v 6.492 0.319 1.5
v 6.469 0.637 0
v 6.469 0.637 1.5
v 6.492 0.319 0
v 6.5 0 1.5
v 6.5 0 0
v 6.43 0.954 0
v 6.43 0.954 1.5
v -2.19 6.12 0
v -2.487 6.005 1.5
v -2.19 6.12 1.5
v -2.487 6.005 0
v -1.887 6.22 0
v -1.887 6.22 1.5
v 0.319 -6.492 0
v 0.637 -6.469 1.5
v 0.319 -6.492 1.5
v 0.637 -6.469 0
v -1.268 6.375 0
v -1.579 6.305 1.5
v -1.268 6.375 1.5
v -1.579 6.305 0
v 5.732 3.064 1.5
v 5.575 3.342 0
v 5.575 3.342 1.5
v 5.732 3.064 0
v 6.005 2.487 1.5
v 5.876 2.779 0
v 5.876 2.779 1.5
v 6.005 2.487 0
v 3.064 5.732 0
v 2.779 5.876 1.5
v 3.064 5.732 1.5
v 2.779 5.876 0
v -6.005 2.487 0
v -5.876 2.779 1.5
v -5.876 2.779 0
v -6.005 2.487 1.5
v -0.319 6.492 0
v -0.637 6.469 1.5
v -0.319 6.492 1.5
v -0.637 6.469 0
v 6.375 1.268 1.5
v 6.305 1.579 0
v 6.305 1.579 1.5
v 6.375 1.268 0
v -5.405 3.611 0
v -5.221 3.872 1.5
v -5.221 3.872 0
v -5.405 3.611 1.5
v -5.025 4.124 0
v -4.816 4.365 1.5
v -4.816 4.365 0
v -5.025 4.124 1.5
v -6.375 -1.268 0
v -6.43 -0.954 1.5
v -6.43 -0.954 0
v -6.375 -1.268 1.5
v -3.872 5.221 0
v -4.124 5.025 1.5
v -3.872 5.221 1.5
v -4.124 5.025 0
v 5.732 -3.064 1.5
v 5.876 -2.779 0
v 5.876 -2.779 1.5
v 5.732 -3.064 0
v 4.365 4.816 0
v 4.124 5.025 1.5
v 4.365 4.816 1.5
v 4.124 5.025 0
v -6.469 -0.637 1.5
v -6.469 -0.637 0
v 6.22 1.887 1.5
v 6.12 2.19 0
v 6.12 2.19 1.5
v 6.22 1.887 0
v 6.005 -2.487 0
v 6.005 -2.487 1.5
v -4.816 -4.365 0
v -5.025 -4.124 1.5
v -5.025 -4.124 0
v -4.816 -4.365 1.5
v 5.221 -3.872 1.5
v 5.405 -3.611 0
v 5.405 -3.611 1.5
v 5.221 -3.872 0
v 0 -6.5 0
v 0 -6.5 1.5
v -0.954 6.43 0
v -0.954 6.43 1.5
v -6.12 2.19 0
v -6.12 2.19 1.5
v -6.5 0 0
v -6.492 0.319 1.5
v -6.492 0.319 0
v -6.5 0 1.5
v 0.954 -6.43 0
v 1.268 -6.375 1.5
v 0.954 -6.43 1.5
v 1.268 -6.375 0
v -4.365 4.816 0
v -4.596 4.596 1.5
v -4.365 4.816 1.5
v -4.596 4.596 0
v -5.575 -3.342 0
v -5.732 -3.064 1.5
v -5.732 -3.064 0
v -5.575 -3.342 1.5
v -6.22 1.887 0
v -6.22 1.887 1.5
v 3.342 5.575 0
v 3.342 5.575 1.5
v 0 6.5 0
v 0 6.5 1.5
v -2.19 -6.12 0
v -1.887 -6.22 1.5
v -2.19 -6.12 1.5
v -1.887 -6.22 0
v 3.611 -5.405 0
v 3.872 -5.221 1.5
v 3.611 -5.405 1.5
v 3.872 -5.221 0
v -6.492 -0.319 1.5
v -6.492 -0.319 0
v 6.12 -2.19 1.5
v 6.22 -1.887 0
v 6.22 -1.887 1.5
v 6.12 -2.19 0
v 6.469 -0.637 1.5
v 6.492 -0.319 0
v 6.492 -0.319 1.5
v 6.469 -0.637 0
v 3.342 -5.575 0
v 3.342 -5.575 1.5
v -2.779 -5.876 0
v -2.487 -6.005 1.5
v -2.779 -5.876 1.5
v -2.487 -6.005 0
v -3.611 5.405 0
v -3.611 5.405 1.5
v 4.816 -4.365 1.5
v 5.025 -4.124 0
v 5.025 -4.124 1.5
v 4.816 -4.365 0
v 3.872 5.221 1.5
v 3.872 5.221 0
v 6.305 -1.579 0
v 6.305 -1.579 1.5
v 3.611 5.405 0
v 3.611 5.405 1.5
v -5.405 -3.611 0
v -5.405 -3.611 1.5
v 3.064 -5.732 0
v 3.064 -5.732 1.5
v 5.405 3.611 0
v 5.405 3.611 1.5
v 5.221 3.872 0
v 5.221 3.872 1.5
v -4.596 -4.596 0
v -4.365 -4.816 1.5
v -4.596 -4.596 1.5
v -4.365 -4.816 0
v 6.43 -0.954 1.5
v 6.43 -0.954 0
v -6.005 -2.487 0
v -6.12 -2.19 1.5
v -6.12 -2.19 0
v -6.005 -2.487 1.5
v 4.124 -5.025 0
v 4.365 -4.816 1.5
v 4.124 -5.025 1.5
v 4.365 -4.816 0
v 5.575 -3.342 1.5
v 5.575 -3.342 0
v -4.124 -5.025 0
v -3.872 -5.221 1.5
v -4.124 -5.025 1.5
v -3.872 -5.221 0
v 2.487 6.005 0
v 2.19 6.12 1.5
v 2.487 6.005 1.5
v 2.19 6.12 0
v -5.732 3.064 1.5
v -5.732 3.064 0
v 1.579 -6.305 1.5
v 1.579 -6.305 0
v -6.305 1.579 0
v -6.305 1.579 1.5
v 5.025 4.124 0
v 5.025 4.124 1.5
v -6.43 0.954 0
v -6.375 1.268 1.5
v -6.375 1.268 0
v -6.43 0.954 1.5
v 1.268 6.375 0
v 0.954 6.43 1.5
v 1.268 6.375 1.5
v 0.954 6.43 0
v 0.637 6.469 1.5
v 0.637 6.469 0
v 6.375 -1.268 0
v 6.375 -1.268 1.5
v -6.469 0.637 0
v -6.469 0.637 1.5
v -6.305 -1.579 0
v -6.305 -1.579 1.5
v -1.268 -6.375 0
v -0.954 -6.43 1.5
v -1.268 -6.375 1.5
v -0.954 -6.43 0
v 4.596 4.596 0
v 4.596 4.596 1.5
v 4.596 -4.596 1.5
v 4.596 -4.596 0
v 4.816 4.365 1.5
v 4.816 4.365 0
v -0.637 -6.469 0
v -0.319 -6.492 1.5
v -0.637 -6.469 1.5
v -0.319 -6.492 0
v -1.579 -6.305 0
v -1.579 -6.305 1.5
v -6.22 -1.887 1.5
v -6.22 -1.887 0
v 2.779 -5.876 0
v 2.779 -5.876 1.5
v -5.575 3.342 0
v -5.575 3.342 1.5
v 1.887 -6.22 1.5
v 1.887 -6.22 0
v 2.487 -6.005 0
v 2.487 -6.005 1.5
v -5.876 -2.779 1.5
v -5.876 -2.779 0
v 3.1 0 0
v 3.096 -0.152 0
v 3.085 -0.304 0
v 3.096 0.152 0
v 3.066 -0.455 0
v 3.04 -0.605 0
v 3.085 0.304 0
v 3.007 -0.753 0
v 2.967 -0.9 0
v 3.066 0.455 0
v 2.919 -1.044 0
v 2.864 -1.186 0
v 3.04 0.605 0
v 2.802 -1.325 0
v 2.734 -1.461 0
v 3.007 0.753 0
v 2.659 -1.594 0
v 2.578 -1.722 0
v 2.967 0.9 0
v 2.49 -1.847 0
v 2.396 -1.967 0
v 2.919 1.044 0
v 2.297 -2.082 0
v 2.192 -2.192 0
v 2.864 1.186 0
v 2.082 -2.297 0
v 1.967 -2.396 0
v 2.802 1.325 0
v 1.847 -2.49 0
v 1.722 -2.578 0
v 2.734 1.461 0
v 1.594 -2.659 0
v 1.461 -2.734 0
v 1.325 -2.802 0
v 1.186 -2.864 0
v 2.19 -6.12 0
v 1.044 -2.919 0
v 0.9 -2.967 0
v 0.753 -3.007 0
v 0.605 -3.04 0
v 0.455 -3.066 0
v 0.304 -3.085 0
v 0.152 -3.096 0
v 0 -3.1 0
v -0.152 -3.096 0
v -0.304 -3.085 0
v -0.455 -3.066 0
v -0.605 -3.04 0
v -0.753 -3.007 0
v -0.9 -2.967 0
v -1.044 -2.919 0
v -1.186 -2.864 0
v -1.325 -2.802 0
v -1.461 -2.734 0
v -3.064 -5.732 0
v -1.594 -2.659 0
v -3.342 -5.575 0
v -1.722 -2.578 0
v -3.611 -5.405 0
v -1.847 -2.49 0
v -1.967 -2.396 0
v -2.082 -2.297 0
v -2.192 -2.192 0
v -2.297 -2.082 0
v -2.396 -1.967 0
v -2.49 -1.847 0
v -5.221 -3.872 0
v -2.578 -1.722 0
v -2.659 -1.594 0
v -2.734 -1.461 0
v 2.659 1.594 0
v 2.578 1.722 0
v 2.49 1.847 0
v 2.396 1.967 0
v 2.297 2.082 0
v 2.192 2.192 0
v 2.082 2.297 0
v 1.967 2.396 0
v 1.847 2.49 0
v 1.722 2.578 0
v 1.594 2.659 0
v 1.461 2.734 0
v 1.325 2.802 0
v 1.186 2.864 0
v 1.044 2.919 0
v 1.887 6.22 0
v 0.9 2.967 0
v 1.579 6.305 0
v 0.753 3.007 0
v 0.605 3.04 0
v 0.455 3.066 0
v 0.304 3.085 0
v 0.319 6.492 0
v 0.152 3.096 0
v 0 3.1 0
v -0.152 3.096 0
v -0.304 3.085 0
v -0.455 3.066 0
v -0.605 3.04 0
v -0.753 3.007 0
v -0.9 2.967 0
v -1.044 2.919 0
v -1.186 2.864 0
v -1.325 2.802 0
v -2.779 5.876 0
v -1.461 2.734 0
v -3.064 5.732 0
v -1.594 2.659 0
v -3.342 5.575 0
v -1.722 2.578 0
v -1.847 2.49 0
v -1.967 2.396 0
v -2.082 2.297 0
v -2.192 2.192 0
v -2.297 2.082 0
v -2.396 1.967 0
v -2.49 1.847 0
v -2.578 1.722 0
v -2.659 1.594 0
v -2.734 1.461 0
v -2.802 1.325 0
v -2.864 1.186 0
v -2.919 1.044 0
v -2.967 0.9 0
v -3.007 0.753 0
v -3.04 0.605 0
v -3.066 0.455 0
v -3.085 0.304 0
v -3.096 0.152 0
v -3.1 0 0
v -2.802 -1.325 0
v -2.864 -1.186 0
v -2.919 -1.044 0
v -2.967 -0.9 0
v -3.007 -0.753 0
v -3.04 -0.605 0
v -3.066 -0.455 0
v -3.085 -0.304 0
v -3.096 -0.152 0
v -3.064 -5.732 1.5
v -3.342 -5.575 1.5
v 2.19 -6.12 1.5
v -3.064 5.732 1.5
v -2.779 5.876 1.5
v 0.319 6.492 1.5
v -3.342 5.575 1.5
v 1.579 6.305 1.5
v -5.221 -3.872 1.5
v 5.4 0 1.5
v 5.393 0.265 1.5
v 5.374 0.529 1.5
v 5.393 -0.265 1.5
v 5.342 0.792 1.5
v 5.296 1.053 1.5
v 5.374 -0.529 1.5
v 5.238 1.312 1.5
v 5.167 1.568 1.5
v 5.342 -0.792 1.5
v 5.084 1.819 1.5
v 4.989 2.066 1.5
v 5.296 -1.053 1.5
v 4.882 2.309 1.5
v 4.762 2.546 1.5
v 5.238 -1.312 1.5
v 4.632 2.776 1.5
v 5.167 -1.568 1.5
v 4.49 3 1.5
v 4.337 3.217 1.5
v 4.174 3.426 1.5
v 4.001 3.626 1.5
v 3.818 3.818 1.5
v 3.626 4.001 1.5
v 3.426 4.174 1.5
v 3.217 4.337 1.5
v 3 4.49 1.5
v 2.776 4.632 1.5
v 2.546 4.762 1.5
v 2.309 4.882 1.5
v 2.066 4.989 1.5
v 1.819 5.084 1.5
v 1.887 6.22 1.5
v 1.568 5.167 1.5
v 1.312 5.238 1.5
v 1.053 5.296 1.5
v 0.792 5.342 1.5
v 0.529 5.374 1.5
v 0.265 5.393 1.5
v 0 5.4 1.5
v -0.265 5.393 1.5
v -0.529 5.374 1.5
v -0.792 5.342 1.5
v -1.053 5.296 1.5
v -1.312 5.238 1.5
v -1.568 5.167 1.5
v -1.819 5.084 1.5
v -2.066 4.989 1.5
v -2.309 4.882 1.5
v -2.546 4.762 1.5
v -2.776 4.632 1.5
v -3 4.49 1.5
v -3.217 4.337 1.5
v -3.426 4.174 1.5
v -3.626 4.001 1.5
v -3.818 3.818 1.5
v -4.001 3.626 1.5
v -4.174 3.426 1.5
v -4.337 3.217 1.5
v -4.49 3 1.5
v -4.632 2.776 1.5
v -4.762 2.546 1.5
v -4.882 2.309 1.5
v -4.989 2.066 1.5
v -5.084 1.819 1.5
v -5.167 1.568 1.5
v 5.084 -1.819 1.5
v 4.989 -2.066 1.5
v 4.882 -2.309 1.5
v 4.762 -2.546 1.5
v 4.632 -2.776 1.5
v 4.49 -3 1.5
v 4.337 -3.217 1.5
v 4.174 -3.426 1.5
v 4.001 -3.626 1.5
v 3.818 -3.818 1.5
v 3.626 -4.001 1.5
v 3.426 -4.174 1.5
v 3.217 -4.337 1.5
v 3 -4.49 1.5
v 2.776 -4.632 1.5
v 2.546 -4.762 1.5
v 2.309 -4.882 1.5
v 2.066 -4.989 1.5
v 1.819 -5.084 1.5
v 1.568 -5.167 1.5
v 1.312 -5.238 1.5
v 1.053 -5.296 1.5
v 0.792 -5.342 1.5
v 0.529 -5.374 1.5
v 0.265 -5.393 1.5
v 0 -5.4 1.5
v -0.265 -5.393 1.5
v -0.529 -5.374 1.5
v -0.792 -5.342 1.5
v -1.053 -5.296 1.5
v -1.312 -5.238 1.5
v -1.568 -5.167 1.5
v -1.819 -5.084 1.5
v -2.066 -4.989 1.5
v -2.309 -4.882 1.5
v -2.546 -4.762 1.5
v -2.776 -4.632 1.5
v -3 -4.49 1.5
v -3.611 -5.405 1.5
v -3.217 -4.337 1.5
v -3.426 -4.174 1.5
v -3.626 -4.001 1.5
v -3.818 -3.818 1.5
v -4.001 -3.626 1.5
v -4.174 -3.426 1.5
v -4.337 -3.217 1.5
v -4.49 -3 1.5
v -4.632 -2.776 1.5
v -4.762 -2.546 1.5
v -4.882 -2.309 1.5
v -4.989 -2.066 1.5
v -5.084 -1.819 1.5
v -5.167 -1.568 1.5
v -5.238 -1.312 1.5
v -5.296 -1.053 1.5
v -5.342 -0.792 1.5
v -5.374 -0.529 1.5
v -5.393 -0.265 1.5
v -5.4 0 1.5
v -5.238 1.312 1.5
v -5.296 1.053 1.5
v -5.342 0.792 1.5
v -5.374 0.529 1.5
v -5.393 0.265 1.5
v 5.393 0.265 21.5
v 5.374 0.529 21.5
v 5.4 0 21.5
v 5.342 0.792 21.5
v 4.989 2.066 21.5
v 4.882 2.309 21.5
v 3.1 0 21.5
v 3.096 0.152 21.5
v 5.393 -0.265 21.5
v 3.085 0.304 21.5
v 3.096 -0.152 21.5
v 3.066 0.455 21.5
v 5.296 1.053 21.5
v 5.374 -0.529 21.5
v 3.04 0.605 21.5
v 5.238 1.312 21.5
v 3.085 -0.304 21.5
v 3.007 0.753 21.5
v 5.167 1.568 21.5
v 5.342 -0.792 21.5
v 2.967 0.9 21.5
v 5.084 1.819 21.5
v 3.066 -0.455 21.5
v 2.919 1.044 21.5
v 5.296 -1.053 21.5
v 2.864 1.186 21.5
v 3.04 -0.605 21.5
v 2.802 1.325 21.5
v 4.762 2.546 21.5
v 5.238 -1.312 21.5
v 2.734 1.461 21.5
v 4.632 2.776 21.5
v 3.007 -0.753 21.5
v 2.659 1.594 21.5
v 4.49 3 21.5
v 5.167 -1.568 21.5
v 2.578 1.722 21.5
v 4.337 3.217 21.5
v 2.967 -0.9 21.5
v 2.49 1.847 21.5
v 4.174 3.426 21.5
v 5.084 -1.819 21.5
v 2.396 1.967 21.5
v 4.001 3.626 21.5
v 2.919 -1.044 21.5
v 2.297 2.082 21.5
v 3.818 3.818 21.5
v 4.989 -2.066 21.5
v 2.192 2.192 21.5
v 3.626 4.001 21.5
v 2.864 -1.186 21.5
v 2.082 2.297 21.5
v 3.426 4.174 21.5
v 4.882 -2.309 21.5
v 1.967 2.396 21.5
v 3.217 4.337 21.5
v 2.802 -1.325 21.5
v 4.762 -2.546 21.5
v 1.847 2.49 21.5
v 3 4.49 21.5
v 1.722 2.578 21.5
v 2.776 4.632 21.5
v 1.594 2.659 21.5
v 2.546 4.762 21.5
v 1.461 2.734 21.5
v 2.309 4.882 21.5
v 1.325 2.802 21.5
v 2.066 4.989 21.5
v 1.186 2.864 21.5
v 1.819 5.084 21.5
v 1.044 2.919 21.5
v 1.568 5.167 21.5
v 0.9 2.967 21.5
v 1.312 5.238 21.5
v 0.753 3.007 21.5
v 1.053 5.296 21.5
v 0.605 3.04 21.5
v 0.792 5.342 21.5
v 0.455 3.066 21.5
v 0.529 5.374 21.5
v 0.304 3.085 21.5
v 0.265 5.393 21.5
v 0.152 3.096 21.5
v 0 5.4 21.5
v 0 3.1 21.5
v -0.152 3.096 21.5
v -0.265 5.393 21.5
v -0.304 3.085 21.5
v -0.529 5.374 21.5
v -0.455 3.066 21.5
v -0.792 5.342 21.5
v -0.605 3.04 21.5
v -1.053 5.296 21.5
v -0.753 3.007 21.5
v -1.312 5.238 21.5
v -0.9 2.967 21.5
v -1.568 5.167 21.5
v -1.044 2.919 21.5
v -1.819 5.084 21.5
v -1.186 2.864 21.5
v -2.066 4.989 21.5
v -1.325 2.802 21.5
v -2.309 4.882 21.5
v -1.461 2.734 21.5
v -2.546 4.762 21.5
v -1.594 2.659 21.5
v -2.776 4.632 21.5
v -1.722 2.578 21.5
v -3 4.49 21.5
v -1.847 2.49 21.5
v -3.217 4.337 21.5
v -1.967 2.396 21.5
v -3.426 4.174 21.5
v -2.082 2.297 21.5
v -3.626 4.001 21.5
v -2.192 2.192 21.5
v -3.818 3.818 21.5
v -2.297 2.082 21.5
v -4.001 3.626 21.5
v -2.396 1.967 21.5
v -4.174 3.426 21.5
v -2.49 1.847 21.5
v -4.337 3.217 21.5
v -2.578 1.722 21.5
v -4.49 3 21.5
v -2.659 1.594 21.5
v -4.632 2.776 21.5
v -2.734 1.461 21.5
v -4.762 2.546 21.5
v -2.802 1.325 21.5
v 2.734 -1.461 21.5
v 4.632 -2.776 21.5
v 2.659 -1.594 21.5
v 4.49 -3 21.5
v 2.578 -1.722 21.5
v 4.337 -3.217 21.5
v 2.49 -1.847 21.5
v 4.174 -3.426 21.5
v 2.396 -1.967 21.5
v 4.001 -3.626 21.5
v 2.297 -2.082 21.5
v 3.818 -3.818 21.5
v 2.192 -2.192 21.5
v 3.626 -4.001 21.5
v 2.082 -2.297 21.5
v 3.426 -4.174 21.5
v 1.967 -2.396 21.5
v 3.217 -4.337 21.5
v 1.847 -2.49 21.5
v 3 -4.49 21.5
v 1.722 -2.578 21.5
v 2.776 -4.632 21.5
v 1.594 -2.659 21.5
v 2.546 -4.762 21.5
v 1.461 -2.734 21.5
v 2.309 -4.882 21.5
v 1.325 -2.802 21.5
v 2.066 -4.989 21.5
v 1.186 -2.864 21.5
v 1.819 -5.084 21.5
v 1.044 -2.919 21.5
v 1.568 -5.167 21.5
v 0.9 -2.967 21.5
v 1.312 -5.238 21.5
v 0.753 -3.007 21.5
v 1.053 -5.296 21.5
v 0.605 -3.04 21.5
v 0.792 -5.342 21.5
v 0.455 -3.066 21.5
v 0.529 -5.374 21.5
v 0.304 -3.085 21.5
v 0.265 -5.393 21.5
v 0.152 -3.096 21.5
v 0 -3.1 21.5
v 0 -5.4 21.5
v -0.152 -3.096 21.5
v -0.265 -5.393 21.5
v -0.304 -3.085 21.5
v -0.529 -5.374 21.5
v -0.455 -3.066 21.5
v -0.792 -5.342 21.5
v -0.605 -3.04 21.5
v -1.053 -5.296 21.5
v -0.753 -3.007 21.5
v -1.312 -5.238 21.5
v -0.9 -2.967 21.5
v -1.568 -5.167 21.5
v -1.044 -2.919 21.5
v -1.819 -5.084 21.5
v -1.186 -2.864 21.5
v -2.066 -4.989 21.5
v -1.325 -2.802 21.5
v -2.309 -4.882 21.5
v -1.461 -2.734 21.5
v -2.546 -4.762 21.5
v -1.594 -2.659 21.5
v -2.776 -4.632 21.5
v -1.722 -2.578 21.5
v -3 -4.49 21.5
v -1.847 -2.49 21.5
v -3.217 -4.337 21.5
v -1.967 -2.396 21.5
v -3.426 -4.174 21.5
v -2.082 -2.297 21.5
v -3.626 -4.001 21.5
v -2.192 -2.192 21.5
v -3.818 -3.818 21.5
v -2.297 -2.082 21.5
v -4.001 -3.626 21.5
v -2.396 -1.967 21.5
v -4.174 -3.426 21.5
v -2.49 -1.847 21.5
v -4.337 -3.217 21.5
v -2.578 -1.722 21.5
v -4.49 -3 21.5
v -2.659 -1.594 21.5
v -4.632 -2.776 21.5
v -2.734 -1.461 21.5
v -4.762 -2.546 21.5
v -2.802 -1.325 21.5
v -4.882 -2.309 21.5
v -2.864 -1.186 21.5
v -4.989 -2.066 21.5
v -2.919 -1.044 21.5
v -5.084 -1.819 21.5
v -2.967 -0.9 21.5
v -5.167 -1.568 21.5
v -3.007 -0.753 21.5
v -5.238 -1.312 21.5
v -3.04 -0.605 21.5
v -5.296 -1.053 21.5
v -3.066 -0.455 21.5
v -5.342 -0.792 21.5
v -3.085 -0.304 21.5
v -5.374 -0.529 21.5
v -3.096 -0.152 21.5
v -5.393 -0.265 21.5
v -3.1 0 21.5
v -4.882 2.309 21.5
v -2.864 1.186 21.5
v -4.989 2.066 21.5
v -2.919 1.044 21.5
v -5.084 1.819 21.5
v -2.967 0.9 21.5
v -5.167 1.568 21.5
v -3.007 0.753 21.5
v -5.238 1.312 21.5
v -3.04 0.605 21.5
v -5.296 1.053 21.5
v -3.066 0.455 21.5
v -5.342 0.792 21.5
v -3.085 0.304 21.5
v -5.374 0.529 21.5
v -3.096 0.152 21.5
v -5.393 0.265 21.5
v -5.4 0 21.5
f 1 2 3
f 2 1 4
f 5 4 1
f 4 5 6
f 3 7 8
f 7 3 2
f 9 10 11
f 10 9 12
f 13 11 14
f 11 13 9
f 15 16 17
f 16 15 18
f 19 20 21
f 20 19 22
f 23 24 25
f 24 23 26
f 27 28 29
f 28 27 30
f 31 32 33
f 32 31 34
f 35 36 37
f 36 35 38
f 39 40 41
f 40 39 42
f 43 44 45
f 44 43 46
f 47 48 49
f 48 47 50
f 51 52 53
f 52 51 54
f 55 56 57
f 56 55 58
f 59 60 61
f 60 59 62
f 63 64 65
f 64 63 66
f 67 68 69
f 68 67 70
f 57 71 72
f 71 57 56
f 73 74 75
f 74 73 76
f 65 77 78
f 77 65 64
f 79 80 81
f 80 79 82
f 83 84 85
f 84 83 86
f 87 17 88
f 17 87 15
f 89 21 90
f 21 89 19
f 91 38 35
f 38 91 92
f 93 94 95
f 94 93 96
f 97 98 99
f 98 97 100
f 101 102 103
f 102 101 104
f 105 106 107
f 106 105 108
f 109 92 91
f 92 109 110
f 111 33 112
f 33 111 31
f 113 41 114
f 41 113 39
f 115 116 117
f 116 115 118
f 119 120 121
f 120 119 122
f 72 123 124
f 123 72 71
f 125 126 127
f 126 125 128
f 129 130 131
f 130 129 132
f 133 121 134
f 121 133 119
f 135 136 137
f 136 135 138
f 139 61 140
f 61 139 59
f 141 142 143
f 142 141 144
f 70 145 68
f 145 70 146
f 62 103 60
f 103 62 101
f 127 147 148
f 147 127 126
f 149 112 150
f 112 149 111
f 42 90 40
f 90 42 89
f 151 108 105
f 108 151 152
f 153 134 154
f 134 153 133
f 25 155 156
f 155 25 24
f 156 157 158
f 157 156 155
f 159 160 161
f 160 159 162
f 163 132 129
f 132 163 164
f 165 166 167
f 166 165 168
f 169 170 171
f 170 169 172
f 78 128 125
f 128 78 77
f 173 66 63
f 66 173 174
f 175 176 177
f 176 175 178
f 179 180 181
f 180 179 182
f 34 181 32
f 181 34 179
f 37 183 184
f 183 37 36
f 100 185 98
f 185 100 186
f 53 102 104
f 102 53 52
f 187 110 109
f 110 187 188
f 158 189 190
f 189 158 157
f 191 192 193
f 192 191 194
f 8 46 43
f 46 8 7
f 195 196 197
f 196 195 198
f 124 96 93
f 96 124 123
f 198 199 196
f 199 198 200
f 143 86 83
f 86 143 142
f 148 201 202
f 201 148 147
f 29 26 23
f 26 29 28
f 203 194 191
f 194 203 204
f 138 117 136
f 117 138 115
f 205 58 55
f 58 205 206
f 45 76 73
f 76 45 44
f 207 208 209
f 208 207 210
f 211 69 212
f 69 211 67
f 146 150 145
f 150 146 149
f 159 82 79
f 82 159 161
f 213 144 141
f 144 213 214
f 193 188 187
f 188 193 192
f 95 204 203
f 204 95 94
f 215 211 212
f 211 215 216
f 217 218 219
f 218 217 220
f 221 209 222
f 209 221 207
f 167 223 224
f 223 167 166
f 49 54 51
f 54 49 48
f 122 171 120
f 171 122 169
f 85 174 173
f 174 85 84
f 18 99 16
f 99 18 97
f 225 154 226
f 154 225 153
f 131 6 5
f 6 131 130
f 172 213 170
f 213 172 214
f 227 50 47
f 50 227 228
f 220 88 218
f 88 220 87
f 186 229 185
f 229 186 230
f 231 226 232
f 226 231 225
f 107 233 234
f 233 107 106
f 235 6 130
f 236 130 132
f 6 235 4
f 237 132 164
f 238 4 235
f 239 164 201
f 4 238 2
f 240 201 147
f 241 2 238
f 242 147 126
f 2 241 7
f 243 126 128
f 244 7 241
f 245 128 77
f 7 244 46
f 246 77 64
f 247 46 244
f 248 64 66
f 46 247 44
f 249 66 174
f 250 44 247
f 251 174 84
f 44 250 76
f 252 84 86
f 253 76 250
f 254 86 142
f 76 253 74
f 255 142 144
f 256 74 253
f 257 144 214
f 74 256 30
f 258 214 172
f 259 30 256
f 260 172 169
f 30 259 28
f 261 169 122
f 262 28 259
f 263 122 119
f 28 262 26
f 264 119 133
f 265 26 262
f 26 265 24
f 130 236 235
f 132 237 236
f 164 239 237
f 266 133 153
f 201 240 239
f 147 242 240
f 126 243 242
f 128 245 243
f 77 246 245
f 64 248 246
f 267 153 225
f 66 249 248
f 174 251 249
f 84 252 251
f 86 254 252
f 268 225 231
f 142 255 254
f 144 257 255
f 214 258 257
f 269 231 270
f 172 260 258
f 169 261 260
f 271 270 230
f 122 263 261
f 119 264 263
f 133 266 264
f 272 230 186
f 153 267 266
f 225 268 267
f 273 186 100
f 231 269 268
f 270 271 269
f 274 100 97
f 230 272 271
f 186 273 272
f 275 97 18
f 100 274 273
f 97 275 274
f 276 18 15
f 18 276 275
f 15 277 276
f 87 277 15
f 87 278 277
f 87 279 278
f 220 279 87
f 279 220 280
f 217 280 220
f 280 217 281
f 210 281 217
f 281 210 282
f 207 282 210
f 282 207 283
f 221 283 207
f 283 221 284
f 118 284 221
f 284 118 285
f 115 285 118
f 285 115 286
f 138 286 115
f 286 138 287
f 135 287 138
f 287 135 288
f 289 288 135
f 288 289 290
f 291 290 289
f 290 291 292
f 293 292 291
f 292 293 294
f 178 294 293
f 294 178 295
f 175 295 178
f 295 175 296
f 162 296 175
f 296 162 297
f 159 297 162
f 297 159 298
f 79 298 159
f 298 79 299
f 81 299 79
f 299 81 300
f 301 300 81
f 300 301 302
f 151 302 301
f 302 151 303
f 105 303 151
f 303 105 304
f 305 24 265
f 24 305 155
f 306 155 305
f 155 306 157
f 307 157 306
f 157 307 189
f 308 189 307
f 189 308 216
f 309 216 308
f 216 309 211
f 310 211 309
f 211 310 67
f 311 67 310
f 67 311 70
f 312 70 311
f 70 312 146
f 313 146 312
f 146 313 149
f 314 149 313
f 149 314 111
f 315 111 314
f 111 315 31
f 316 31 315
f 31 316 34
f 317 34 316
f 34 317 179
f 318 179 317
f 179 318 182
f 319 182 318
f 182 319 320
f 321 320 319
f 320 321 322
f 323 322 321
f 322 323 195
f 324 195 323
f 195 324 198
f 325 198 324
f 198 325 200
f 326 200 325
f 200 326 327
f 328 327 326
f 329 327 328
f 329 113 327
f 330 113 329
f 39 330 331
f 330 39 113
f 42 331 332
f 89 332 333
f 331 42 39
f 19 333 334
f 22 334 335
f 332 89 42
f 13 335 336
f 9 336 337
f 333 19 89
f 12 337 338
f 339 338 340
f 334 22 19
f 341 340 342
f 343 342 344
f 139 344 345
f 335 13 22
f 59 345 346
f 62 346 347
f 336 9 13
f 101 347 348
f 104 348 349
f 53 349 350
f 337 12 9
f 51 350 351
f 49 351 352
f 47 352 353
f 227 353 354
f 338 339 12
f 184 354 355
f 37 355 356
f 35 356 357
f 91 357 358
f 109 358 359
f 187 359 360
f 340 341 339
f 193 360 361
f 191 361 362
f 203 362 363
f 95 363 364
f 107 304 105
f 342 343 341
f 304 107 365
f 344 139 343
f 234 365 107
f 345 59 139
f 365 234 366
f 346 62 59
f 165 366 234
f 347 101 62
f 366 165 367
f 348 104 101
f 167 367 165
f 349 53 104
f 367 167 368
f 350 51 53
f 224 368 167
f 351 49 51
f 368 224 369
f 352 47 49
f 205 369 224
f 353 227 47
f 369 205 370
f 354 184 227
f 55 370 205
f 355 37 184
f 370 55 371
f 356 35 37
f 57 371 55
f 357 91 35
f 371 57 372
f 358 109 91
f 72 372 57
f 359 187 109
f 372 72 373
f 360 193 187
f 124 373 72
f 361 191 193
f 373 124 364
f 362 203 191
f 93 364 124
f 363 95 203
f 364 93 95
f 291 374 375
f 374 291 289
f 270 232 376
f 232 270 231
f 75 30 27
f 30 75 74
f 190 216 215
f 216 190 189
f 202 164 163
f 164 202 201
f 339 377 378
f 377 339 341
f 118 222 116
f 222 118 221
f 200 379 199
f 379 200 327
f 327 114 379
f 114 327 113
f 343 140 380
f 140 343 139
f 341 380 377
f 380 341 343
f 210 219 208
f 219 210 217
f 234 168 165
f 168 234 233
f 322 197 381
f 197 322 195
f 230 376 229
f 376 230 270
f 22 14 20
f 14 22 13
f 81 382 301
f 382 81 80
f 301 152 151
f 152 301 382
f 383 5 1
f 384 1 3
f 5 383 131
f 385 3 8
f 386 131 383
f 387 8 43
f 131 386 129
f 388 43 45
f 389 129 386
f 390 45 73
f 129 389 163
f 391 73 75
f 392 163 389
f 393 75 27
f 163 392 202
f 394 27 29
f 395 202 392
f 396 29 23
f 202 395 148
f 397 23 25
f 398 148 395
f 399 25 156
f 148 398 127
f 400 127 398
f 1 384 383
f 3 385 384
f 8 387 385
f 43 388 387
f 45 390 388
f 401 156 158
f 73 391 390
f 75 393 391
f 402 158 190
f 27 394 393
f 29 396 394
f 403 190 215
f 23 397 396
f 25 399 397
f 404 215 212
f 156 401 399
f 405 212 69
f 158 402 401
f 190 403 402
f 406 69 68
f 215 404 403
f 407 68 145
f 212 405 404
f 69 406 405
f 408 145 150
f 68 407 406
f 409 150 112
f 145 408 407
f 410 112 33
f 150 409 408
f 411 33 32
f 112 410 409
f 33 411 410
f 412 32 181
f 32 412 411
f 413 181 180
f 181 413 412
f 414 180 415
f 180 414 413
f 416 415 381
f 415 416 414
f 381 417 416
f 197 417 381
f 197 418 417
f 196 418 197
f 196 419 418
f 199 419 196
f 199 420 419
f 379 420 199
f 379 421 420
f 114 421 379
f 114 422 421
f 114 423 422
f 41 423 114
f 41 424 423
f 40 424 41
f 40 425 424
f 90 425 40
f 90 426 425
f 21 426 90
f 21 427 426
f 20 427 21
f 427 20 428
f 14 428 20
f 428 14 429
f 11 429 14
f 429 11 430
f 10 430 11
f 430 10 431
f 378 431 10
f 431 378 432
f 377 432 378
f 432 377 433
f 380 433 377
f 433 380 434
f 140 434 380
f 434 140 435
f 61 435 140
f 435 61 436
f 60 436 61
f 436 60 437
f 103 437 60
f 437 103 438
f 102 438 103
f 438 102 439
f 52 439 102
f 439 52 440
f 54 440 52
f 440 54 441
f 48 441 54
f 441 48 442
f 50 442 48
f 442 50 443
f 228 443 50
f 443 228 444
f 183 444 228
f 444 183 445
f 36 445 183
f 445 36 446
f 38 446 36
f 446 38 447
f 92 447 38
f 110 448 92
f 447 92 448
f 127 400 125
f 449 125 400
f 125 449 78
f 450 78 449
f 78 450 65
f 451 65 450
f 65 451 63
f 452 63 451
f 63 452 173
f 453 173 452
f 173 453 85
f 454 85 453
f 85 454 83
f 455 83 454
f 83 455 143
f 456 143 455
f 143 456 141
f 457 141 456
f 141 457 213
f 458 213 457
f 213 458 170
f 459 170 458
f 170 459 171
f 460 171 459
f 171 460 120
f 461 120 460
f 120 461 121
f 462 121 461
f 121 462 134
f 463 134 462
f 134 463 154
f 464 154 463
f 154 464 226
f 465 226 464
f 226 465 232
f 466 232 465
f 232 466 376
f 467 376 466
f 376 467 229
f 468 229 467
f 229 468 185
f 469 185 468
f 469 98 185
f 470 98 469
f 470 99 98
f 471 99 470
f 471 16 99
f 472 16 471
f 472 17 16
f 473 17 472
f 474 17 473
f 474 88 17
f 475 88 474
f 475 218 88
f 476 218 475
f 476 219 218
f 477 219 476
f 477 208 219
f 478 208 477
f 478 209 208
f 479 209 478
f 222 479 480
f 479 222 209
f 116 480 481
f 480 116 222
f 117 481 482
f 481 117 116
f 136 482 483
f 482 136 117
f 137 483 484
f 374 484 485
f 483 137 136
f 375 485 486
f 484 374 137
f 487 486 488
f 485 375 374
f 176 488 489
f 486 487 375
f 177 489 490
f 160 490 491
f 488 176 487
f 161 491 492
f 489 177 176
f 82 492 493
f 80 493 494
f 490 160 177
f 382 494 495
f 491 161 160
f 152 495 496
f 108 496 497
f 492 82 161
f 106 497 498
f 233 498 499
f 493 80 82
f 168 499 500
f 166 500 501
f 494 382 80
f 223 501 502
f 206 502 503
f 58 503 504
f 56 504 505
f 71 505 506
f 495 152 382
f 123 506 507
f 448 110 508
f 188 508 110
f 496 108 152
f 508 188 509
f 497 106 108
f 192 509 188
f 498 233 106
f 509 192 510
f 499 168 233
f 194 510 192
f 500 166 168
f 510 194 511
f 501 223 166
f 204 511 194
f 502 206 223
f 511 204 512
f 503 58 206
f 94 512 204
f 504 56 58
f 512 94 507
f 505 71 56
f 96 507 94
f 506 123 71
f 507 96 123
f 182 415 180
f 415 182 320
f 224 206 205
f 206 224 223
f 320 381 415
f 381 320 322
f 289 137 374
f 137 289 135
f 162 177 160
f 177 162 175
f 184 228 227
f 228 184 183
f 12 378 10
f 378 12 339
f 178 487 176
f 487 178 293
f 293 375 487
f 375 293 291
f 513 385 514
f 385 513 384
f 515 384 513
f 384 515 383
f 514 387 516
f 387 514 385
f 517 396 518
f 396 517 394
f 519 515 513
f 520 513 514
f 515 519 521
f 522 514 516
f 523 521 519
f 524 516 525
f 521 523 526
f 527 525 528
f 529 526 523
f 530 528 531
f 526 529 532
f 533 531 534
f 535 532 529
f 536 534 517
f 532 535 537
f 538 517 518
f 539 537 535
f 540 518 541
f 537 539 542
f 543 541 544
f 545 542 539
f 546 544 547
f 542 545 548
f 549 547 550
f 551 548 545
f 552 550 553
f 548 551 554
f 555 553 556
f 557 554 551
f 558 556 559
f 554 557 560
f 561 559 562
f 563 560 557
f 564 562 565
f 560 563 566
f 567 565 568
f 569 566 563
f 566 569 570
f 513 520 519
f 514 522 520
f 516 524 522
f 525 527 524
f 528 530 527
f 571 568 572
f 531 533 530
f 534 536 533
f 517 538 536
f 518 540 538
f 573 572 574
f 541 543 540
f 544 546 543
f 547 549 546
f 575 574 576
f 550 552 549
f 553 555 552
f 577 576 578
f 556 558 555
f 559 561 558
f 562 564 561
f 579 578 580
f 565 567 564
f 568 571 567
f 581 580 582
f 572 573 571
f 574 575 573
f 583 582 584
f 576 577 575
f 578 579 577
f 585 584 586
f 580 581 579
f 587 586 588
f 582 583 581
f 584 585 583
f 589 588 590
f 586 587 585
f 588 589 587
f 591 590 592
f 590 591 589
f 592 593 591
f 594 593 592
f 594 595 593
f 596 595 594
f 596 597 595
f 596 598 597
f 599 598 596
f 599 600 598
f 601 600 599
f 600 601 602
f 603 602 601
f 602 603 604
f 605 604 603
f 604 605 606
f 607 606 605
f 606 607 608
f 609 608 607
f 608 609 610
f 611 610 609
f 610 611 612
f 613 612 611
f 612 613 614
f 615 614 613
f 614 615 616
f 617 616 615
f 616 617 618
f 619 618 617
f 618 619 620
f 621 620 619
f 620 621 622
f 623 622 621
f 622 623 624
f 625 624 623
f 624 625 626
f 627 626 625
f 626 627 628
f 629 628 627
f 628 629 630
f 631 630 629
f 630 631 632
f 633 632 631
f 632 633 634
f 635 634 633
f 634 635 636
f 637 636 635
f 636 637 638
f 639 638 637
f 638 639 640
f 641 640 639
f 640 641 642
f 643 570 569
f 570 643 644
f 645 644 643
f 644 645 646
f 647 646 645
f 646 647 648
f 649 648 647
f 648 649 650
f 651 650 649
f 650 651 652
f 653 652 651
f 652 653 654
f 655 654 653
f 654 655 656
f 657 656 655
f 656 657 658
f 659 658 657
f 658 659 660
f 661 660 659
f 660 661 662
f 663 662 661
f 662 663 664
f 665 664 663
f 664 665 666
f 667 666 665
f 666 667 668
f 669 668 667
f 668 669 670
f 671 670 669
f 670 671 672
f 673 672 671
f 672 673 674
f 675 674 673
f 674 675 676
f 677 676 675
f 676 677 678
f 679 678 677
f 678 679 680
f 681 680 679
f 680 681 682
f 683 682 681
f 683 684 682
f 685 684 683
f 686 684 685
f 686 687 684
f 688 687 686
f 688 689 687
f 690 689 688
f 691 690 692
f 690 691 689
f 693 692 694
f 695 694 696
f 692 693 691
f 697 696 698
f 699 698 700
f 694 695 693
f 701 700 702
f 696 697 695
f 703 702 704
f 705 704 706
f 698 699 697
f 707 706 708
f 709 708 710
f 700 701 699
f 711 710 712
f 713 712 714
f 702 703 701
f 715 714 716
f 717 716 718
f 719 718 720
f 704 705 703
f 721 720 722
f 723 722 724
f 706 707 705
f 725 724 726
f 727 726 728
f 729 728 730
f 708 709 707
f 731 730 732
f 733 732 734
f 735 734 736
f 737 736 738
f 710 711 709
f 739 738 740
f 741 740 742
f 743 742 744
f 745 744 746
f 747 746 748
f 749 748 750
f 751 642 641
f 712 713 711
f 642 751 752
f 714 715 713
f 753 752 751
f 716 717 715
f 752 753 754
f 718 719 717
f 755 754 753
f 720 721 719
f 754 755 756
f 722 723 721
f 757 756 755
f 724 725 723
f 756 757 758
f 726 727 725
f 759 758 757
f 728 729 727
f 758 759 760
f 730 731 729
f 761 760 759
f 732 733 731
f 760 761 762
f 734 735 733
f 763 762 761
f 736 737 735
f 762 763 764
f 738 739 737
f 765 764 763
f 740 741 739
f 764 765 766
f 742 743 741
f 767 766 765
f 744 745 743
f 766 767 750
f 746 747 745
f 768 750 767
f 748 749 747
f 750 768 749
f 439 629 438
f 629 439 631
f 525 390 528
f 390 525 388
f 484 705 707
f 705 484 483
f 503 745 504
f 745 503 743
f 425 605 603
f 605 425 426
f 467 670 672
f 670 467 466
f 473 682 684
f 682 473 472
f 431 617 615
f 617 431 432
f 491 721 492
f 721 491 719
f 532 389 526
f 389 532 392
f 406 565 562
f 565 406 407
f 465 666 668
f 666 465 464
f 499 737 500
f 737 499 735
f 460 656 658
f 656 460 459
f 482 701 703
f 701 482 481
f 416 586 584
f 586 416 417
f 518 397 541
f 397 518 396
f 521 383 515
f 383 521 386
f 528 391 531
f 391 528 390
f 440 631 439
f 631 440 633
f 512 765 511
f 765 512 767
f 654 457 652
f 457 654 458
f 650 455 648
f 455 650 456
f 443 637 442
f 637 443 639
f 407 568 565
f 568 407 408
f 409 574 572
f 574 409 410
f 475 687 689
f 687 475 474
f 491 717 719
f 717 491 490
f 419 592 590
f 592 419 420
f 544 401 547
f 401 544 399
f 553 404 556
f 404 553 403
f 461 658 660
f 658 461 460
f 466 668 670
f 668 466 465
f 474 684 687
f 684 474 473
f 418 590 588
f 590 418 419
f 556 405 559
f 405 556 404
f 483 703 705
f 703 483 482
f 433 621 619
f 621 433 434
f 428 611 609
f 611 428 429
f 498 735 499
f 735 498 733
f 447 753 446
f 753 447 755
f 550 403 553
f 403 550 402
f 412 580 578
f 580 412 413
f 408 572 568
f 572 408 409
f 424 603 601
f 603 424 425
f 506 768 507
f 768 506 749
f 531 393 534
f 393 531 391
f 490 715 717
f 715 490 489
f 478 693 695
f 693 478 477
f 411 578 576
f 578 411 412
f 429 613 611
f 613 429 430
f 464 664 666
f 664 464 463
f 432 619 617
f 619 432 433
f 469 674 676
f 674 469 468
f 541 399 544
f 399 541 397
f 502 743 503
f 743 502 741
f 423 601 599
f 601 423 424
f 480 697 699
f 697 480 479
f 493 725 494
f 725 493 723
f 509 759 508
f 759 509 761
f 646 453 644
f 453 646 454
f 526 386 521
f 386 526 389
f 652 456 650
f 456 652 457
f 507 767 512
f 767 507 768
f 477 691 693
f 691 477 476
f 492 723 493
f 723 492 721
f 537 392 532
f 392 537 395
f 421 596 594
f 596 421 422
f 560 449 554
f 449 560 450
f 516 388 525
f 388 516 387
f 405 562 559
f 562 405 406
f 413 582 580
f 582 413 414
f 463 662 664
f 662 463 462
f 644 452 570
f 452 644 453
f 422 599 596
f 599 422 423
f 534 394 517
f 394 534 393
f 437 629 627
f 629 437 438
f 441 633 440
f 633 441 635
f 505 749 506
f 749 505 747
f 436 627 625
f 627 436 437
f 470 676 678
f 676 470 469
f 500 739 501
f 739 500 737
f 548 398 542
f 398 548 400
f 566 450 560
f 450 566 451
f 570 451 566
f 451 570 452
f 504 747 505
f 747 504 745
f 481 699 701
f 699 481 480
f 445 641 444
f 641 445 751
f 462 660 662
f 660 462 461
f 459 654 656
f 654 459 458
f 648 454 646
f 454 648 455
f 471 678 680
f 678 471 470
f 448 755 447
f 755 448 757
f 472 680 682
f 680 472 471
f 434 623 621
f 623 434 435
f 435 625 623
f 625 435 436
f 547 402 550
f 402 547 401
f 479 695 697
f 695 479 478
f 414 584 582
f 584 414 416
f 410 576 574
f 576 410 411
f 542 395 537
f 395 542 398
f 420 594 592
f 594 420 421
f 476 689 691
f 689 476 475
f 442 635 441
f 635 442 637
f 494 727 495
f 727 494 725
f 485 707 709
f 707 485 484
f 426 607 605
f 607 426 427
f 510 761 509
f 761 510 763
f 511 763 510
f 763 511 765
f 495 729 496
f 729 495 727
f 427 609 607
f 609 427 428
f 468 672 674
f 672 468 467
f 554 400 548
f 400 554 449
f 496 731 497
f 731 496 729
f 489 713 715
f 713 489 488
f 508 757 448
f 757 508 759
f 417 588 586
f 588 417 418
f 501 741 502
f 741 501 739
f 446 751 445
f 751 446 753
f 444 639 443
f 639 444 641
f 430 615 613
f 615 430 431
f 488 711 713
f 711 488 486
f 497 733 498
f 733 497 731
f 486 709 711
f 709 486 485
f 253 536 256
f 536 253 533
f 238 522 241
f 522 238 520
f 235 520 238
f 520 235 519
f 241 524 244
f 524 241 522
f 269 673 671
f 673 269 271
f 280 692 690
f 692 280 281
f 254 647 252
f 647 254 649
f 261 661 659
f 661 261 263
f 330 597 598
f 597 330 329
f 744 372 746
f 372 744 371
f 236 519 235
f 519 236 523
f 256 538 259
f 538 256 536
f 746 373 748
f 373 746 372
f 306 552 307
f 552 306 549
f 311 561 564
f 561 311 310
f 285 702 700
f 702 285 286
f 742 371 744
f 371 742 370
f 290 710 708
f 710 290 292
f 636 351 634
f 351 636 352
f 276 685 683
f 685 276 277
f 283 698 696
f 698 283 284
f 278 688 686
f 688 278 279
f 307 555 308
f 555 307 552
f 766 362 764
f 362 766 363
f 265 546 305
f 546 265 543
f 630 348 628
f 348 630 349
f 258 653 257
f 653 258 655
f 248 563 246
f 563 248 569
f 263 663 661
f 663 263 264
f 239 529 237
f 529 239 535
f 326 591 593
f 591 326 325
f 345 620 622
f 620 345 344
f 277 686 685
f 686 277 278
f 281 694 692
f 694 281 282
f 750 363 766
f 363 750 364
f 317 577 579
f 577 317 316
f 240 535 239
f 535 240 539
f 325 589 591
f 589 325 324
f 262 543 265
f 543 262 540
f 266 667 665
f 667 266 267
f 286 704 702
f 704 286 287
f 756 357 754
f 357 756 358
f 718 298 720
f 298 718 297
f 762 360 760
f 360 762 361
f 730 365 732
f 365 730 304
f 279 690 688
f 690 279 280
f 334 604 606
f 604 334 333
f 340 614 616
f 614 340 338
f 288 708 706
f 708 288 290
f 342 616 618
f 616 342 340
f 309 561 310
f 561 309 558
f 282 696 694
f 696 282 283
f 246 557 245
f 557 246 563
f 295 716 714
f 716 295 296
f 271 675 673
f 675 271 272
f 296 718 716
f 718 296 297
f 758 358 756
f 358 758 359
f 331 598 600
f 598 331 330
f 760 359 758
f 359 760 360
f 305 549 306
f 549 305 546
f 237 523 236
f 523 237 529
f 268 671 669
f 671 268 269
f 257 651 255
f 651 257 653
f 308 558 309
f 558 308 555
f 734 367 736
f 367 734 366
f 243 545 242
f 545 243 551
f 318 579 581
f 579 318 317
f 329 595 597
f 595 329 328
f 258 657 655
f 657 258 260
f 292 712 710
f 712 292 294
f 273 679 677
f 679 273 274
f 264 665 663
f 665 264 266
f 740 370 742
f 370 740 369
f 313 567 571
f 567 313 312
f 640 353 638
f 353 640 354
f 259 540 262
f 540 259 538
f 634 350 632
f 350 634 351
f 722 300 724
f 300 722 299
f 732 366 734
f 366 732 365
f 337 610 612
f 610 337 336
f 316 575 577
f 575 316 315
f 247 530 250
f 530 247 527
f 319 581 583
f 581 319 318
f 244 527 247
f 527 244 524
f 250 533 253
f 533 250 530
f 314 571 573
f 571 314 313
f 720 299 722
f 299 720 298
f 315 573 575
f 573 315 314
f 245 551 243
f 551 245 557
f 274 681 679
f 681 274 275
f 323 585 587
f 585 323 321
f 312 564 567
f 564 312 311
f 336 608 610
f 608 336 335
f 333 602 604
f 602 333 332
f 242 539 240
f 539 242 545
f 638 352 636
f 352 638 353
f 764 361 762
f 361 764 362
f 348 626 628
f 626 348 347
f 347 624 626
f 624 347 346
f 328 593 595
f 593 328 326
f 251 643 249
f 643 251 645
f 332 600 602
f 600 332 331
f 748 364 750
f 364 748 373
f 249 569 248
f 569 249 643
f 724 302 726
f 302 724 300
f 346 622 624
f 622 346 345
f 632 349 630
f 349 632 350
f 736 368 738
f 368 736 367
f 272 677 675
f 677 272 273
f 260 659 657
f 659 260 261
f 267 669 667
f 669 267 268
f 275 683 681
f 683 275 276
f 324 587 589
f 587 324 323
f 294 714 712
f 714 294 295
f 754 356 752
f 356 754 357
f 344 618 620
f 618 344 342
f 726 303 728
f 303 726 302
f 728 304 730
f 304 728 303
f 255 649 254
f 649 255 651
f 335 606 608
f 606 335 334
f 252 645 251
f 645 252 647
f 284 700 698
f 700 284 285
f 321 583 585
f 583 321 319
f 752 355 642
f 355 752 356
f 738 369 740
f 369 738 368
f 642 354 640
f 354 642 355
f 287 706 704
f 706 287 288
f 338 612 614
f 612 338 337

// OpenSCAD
// Adapter Sleeve for 0.2mL PCR tube in 1.5mL rack
// Print orientation: Upside down (Collar on bed)
// Units: mm

// Dimensions
$fn = 128; // High resolution for smooth curves

// Collar (Base)
$collar_outer_d = 13;
$collar_thickness = 1.5;

// Sleeve Body
$sleeve_outer_d = 10.8;
$sleeve_total_height = 21.5;
$sleeve_inner_d = 6.2;

// Calculated heights
$collar_z_start = 0;
$collar_z_end = $collar_thickness;
$sleeve_z_start = $collar_thickness;
$sleeve_z_end = $sleeve_total_height;

// Build the part
difference() {
    // 1. Main Outer Shape (Collar + Sleeve)
    union() {
        // Collar
        cylinder(
            h = $collar_thickness,
            d = $collar_outer_d,
            center = false
        );
        
        // Sleeve Body
        translate([0, 0, $collar_thickness]) {
            cylinder(
                h = $sleeve_total_height - $collar_thickness,
                d = $sleeve_outer_d,
                center = false
            );
        }
    }
    
    // 2. Inner Bore (Hole)
    // The hole runs through the full height (0 to 21.5)
    translate([0, 0, 0]) {
        cylinder(
            h = $sleeve_total_height,
            d = $sleeve_inner_d,
            center = false
        );
    }
}
